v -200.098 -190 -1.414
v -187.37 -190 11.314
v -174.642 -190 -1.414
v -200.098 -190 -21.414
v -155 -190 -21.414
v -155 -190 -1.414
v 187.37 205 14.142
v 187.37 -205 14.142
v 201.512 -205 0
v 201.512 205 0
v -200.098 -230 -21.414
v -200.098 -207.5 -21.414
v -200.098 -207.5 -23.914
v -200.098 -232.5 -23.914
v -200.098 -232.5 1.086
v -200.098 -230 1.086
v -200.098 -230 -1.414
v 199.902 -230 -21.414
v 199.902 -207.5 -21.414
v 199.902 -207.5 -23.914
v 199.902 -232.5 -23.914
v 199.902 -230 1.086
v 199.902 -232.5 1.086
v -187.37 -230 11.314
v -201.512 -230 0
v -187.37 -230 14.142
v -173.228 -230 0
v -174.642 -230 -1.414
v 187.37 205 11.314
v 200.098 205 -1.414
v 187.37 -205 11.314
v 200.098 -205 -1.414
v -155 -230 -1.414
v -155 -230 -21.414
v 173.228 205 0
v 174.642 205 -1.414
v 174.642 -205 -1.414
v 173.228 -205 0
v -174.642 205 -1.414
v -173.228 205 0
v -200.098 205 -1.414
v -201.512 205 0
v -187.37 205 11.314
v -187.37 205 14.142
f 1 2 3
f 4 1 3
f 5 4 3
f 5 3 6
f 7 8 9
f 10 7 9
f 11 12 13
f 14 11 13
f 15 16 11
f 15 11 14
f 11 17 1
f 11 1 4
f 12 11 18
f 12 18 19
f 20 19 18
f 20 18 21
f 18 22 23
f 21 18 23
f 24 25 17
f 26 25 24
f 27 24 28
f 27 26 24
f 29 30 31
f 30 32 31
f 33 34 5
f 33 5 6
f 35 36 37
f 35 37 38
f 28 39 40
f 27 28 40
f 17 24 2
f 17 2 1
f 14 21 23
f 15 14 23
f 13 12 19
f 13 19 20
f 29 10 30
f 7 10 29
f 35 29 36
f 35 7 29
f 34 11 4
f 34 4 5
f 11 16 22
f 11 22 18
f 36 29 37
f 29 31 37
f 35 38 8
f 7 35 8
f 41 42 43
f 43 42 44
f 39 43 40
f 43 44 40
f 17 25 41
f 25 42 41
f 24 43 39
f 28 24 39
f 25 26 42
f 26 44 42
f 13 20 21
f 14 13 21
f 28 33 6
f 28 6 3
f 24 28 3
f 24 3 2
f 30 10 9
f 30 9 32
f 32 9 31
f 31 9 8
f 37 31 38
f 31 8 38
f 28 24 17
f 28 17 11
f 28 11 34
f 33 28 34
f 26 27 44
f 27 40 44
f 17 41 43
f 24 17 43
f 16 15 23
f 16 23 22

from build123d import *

# Parameters (mm, degrees)
F1_DEPTH = 205
F2_DEPTH = 25
F4_DEPTH = 40
F6_DEPTH = 400


# Not quite as in the source:
# - a pattern or mirror of a feature is missing from the dataset's text; its kind, count and spacing are read off the source's solid


with BuildPart() as f1:
    # F0 (on Front) → F1 (new body, symmetric)
    with BuildSketch(Plane.XZ):
        Polygon((-174.6419423149, -1.4142135624), (-173.2277287525, 0), (-187.3698643763, 14.1421356237), (-201.512, 0), (-200.0977864376, -1.4142135624), (-187.3698643763, 11.313708499), align=None)
    extrude(amount=F1_DEPTH, both=True)


with BuildPart() as f1_copies_1:
    # F1_copies: instance of F1
    add(f1.part.mirror(Plane(origin=(0, 0, 0), x_dir=(0, 0, 1), z_dir=(1, 0, 0))))


with BuildPart() as f1_1:
    add(f1.part)

    # F2 (add): a face of the model
    f2_faces = [f1_1.faces().sort_by_distance(p)[0] for p in [
        (-174.1630897779, -205, -0.478852537),
    ]]
    extrude(f2_faces, amount=F2_DEPTH)


with BuildPart() as f4:
    # F3 (on face) → F4 (new body)
    with BuildSketch(Plane.XZ.offset(230)):
        Polygon((-174.6419423149, -1.4142135624), (-187.3698643763, 11.313708499), (-200.0977864376, -1.4142135624), (-200.0977864376, -21.4142135624), (-155, -21.4142135624), (-155, -1.4142135624), align=None)
    extrude(amount=-F4_DEPTH)


with BuildPart() as f6:
    # F5 (on face) → F6 (new body)
    with BuildSketch(Plane(origin=(-200.0977864376, 0, 0), x_dir=(0, -1, 0), z_dir=(-1, 0, 0))):
        Polygon((230, 1.0857864376), (230, -21.4142135624), (207.5, -21.4142135624), (207.5, -23.9142135624), (232.5, -23.9142135624), (232.5, 1.0857864376), align=None)
    extrude(amount=-F6_DEPTH)


solid = Compound([f1_copies_1.part, f1_1.part, f4.part, f6.part])
